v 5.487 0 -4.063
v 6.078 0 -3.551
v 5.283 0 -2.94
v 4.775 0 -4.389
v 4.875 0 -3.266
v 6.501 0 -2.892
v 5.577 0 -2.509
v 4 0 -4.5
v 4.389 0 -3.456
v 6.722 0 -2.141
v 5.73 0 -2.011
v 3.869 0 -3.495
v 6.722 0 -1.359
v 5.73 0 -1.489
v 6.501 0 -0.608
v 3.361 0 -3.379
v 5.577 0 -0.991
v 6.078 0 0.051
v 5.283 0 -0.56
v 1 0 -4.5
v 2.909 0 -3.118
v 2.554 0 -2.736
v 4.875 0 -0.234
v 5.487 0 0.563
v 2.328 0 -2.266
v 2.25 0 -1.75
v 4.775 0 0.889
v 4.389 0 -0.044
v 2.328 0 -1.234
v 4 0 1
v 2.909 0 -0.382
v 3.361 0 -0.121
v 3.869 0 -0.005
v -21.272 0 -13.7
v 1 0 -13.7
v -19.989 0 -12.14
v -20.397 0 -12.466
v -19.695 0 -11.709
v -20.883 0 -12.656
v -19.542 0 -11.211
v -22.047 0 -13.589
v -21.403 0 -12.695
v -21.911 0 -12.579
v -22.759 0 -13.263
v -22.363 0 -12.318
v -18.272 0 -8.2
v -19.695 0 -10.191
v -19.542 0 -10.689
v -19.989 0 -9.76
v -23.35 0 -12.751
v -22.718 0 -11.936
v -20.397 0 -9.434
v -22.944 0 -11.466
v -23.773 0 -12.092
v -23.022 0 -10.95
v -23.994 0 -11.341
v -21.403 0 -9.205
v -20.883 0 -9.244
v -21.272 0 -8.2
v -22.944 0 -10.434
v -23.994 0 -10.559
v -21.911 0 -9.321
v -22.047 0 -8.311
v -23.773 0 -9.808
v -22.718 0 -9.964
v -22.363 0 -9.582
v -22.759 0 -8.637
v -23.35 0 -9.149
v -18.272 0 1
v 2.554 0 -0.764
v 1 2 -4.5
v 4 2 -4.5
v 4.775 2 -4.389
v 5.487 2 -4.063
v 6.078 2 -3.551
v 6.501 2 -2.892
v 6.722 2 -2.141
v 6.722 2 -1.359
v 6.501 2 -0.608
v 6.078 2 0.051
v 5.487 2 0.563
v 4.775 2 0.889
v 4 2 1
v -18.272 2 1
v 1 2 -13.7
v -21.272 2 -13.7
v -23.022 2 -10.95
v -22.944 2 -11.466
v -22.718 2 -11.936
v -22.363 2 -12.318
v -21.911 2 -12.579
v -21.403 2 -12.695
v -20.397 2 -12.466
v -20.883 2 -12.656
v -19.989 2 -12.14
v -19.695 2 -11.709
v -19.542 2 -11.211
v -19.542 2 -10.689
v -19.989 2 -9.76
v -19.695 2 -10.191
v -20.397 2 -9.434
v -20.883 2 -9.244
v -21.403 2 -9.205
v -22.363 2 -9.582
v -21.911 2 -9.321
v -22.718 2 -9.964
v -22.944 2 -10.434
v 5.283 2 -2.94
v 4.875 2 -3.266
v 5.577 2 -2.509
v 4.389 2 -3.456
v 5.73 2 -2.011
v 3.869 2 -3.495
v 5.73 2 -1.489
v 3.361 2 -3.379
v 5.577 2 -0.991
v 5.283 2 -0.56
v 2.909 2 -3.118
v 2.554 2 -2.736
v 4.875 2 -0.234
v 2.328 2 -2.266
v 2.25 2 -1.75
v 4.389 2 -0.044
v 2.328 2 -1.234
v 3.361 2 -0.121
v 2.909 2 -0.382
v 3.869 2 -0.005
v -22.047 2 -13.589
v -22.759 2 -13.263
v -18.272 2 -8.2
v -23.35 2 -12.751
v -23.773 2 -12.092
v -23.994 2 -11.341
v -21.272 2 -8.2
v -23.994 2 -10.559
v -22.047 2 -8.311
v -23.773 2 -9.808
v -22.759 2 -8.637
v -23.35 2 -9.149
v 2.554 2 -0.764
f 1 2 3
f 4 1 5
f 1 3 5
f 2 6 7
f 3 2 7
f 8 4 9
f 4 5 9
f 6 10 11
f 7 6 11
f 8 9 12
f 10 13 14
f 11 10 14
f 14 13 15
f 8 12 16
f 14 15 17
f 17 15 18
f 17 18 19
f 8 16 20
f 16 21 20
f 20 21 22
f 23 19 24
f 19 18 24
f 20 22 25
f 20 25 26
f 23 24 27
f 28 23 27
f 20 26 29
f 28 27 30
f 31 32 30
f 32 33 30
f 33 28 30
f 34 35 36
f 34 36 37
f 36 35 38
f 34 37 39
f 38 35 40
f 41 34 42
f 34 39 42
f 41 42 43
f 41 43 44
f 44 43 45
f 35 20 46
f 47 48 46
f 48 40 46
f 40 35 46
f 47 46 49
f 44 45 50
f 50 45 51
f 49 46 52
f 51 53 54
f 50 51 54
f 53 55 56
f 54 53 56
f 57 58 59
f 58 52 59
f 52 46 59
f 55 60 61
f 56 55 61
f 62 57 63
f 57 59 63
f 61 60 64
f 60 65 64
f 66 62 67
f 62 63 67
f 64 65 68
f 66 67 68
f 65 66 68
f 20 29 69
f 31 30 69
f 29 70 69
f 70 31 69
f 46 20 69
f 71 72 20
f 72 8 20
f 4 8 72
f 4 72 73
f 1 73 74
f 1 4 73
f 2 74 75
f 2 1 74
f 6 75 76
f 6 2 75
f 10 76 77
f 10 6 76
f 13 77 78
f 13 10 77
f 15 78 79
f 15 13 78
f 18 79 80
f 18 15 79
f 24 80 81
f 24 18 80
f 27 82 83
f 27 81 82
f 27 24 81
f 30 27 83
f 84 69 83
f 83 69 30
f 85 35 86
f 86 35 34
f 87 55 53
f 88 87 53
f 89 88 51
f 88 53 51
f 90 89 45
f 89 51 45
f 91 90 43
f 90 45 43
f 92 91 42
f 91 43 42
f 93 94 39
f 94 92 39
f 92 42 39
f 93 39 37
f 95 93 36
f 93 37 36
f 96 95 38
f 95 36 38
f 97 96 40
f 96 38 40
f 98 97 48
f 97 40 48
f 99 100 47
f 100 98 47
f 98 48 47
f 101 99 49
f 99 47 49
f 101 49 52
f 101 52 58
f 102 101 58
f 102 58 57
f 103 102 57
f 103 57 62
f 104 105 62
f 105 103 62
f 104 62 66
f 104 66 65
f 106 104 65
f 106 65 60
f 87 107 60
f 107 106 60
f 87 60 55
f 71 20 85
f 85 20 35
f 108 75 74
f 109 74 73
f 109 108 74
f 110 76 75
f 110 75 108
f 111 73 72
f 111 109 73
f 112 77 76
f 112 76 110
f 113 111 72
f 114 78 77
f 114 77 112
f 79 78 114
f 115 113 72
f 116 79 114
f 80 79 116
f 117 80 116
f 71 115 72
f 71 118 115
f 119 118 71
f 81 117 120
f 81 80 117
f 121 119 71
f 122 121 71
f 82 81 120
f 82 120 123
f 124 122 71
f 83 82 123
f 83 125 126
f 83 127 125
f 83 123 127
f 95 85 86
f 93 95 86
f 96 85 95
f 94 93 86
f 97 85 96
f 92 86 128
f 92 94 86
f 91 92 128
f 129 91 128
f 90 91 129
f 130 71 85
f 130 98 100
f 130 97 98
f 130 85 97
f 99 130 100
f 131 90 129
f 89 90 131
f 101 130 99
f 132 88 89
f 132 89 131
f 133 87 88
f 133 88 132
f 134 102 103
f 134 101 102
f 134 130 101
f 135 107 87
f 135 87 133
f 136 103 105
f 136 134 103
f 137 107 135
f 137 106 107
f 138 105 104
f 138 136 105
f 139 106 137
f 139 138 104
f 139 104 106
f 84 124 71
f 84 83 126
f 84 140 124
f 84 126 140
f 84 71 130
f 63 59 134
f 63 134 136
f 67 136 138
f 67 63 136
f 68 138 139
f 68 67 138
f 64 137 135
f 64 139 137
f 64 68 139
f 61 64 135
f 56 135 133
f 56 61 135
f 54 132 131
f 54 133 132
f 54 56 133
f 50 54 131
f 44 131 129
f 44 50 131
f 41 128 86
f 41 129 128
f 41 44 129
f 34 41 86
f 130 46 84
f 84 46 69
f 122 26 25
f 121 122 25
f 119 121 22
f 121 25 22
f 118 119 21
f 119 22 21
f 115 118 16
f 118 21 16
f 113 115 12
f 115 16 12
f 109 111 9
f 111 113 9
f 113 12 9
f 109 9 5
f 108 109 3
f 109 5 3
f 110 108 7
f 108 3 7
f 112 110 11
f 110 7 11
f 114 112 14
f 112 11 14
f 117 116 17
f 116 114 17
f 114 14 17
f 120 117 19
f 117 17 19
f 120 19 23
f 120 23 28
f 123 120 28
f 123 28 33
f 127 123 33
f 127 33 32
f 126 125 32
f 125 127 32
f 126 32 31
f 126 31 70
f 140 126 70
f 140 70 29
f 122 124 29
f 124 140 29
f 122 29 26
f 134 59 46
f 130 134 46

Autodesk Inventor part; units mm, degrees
ref_plane "YZ Plane" through (0, 0, 0) normal (1, 0, 0) x (0, 1, 0)
ref_plane "XZ Plane" through (0, 0, 0) normal (0, 1, 0) x (-1, 0, 0)
ref_plane "XY Plane" through (0, 0, 0) normal (0, 0, 1) x (1, 0, 0)
sketch "Sketch1" plane through (0, 0, 0) normal (0, 1, 0) x (-1, 0, 0)
  line L0 (0, 0) -> (17.272, 0)
  line L1 (17.272, 0) -> (17.272, -12.7)
  line L2 (17.272, -12.7) -> (0, -12.7)
  line L3 (0, -12.7) -> (0, 0)
  circle A0 centre (21.272, -10.95) radius 1.75
  circle A1 centre (-4, -1.75) radius 1.75
  line L4 (17.272, -6.35) -> (0, -6.35) construction
  circle A2 centre (21.272, -10.95) radius 2.75
  line L5 (18.272, -13.7) -> (18.272, 1)
  line L6 (18.272, 1) -> (-1, 1)
  line L7 (-1, 1) -> (-1, -13.7)
  line L8 (-1, -13.7) -> (18.272, -13.7)
  line L9 (18.272, -13.7) -> (21.272, -13.7)
  line L10 (21.272, -8.2) -> (18.272, -8.2)
  circle A3 centre (-4, -1.75) radius 2.75
  line L11 (-1, 1) -> (-4, 1)
  line L12 (-4, -4.5) -> (-1, -4.5)
  dimension "d0" = 17.272
  dimension "d1" = 12.7
  dimension "d2" = 3.5
  dimension "d3" = 3.5
  dimension "d4" = 4
  dimension "d5" = 4
  dimension "d6" = 5.5
  dimension "d7" = 5.5
extrude "Extrusion1" add sketch "Sketch1" along normal blind 2 contours L0 L1 L2 L3 | A2 | A2 L9 L5 L10 | L5 L8 L7 L6 | L7 L12 A3 L11 | A3
equation "\"d3\" = d2"
equation "\"d5\" = d4"
equation "\"d7\" = d6"
properties part number "USB Mount"
